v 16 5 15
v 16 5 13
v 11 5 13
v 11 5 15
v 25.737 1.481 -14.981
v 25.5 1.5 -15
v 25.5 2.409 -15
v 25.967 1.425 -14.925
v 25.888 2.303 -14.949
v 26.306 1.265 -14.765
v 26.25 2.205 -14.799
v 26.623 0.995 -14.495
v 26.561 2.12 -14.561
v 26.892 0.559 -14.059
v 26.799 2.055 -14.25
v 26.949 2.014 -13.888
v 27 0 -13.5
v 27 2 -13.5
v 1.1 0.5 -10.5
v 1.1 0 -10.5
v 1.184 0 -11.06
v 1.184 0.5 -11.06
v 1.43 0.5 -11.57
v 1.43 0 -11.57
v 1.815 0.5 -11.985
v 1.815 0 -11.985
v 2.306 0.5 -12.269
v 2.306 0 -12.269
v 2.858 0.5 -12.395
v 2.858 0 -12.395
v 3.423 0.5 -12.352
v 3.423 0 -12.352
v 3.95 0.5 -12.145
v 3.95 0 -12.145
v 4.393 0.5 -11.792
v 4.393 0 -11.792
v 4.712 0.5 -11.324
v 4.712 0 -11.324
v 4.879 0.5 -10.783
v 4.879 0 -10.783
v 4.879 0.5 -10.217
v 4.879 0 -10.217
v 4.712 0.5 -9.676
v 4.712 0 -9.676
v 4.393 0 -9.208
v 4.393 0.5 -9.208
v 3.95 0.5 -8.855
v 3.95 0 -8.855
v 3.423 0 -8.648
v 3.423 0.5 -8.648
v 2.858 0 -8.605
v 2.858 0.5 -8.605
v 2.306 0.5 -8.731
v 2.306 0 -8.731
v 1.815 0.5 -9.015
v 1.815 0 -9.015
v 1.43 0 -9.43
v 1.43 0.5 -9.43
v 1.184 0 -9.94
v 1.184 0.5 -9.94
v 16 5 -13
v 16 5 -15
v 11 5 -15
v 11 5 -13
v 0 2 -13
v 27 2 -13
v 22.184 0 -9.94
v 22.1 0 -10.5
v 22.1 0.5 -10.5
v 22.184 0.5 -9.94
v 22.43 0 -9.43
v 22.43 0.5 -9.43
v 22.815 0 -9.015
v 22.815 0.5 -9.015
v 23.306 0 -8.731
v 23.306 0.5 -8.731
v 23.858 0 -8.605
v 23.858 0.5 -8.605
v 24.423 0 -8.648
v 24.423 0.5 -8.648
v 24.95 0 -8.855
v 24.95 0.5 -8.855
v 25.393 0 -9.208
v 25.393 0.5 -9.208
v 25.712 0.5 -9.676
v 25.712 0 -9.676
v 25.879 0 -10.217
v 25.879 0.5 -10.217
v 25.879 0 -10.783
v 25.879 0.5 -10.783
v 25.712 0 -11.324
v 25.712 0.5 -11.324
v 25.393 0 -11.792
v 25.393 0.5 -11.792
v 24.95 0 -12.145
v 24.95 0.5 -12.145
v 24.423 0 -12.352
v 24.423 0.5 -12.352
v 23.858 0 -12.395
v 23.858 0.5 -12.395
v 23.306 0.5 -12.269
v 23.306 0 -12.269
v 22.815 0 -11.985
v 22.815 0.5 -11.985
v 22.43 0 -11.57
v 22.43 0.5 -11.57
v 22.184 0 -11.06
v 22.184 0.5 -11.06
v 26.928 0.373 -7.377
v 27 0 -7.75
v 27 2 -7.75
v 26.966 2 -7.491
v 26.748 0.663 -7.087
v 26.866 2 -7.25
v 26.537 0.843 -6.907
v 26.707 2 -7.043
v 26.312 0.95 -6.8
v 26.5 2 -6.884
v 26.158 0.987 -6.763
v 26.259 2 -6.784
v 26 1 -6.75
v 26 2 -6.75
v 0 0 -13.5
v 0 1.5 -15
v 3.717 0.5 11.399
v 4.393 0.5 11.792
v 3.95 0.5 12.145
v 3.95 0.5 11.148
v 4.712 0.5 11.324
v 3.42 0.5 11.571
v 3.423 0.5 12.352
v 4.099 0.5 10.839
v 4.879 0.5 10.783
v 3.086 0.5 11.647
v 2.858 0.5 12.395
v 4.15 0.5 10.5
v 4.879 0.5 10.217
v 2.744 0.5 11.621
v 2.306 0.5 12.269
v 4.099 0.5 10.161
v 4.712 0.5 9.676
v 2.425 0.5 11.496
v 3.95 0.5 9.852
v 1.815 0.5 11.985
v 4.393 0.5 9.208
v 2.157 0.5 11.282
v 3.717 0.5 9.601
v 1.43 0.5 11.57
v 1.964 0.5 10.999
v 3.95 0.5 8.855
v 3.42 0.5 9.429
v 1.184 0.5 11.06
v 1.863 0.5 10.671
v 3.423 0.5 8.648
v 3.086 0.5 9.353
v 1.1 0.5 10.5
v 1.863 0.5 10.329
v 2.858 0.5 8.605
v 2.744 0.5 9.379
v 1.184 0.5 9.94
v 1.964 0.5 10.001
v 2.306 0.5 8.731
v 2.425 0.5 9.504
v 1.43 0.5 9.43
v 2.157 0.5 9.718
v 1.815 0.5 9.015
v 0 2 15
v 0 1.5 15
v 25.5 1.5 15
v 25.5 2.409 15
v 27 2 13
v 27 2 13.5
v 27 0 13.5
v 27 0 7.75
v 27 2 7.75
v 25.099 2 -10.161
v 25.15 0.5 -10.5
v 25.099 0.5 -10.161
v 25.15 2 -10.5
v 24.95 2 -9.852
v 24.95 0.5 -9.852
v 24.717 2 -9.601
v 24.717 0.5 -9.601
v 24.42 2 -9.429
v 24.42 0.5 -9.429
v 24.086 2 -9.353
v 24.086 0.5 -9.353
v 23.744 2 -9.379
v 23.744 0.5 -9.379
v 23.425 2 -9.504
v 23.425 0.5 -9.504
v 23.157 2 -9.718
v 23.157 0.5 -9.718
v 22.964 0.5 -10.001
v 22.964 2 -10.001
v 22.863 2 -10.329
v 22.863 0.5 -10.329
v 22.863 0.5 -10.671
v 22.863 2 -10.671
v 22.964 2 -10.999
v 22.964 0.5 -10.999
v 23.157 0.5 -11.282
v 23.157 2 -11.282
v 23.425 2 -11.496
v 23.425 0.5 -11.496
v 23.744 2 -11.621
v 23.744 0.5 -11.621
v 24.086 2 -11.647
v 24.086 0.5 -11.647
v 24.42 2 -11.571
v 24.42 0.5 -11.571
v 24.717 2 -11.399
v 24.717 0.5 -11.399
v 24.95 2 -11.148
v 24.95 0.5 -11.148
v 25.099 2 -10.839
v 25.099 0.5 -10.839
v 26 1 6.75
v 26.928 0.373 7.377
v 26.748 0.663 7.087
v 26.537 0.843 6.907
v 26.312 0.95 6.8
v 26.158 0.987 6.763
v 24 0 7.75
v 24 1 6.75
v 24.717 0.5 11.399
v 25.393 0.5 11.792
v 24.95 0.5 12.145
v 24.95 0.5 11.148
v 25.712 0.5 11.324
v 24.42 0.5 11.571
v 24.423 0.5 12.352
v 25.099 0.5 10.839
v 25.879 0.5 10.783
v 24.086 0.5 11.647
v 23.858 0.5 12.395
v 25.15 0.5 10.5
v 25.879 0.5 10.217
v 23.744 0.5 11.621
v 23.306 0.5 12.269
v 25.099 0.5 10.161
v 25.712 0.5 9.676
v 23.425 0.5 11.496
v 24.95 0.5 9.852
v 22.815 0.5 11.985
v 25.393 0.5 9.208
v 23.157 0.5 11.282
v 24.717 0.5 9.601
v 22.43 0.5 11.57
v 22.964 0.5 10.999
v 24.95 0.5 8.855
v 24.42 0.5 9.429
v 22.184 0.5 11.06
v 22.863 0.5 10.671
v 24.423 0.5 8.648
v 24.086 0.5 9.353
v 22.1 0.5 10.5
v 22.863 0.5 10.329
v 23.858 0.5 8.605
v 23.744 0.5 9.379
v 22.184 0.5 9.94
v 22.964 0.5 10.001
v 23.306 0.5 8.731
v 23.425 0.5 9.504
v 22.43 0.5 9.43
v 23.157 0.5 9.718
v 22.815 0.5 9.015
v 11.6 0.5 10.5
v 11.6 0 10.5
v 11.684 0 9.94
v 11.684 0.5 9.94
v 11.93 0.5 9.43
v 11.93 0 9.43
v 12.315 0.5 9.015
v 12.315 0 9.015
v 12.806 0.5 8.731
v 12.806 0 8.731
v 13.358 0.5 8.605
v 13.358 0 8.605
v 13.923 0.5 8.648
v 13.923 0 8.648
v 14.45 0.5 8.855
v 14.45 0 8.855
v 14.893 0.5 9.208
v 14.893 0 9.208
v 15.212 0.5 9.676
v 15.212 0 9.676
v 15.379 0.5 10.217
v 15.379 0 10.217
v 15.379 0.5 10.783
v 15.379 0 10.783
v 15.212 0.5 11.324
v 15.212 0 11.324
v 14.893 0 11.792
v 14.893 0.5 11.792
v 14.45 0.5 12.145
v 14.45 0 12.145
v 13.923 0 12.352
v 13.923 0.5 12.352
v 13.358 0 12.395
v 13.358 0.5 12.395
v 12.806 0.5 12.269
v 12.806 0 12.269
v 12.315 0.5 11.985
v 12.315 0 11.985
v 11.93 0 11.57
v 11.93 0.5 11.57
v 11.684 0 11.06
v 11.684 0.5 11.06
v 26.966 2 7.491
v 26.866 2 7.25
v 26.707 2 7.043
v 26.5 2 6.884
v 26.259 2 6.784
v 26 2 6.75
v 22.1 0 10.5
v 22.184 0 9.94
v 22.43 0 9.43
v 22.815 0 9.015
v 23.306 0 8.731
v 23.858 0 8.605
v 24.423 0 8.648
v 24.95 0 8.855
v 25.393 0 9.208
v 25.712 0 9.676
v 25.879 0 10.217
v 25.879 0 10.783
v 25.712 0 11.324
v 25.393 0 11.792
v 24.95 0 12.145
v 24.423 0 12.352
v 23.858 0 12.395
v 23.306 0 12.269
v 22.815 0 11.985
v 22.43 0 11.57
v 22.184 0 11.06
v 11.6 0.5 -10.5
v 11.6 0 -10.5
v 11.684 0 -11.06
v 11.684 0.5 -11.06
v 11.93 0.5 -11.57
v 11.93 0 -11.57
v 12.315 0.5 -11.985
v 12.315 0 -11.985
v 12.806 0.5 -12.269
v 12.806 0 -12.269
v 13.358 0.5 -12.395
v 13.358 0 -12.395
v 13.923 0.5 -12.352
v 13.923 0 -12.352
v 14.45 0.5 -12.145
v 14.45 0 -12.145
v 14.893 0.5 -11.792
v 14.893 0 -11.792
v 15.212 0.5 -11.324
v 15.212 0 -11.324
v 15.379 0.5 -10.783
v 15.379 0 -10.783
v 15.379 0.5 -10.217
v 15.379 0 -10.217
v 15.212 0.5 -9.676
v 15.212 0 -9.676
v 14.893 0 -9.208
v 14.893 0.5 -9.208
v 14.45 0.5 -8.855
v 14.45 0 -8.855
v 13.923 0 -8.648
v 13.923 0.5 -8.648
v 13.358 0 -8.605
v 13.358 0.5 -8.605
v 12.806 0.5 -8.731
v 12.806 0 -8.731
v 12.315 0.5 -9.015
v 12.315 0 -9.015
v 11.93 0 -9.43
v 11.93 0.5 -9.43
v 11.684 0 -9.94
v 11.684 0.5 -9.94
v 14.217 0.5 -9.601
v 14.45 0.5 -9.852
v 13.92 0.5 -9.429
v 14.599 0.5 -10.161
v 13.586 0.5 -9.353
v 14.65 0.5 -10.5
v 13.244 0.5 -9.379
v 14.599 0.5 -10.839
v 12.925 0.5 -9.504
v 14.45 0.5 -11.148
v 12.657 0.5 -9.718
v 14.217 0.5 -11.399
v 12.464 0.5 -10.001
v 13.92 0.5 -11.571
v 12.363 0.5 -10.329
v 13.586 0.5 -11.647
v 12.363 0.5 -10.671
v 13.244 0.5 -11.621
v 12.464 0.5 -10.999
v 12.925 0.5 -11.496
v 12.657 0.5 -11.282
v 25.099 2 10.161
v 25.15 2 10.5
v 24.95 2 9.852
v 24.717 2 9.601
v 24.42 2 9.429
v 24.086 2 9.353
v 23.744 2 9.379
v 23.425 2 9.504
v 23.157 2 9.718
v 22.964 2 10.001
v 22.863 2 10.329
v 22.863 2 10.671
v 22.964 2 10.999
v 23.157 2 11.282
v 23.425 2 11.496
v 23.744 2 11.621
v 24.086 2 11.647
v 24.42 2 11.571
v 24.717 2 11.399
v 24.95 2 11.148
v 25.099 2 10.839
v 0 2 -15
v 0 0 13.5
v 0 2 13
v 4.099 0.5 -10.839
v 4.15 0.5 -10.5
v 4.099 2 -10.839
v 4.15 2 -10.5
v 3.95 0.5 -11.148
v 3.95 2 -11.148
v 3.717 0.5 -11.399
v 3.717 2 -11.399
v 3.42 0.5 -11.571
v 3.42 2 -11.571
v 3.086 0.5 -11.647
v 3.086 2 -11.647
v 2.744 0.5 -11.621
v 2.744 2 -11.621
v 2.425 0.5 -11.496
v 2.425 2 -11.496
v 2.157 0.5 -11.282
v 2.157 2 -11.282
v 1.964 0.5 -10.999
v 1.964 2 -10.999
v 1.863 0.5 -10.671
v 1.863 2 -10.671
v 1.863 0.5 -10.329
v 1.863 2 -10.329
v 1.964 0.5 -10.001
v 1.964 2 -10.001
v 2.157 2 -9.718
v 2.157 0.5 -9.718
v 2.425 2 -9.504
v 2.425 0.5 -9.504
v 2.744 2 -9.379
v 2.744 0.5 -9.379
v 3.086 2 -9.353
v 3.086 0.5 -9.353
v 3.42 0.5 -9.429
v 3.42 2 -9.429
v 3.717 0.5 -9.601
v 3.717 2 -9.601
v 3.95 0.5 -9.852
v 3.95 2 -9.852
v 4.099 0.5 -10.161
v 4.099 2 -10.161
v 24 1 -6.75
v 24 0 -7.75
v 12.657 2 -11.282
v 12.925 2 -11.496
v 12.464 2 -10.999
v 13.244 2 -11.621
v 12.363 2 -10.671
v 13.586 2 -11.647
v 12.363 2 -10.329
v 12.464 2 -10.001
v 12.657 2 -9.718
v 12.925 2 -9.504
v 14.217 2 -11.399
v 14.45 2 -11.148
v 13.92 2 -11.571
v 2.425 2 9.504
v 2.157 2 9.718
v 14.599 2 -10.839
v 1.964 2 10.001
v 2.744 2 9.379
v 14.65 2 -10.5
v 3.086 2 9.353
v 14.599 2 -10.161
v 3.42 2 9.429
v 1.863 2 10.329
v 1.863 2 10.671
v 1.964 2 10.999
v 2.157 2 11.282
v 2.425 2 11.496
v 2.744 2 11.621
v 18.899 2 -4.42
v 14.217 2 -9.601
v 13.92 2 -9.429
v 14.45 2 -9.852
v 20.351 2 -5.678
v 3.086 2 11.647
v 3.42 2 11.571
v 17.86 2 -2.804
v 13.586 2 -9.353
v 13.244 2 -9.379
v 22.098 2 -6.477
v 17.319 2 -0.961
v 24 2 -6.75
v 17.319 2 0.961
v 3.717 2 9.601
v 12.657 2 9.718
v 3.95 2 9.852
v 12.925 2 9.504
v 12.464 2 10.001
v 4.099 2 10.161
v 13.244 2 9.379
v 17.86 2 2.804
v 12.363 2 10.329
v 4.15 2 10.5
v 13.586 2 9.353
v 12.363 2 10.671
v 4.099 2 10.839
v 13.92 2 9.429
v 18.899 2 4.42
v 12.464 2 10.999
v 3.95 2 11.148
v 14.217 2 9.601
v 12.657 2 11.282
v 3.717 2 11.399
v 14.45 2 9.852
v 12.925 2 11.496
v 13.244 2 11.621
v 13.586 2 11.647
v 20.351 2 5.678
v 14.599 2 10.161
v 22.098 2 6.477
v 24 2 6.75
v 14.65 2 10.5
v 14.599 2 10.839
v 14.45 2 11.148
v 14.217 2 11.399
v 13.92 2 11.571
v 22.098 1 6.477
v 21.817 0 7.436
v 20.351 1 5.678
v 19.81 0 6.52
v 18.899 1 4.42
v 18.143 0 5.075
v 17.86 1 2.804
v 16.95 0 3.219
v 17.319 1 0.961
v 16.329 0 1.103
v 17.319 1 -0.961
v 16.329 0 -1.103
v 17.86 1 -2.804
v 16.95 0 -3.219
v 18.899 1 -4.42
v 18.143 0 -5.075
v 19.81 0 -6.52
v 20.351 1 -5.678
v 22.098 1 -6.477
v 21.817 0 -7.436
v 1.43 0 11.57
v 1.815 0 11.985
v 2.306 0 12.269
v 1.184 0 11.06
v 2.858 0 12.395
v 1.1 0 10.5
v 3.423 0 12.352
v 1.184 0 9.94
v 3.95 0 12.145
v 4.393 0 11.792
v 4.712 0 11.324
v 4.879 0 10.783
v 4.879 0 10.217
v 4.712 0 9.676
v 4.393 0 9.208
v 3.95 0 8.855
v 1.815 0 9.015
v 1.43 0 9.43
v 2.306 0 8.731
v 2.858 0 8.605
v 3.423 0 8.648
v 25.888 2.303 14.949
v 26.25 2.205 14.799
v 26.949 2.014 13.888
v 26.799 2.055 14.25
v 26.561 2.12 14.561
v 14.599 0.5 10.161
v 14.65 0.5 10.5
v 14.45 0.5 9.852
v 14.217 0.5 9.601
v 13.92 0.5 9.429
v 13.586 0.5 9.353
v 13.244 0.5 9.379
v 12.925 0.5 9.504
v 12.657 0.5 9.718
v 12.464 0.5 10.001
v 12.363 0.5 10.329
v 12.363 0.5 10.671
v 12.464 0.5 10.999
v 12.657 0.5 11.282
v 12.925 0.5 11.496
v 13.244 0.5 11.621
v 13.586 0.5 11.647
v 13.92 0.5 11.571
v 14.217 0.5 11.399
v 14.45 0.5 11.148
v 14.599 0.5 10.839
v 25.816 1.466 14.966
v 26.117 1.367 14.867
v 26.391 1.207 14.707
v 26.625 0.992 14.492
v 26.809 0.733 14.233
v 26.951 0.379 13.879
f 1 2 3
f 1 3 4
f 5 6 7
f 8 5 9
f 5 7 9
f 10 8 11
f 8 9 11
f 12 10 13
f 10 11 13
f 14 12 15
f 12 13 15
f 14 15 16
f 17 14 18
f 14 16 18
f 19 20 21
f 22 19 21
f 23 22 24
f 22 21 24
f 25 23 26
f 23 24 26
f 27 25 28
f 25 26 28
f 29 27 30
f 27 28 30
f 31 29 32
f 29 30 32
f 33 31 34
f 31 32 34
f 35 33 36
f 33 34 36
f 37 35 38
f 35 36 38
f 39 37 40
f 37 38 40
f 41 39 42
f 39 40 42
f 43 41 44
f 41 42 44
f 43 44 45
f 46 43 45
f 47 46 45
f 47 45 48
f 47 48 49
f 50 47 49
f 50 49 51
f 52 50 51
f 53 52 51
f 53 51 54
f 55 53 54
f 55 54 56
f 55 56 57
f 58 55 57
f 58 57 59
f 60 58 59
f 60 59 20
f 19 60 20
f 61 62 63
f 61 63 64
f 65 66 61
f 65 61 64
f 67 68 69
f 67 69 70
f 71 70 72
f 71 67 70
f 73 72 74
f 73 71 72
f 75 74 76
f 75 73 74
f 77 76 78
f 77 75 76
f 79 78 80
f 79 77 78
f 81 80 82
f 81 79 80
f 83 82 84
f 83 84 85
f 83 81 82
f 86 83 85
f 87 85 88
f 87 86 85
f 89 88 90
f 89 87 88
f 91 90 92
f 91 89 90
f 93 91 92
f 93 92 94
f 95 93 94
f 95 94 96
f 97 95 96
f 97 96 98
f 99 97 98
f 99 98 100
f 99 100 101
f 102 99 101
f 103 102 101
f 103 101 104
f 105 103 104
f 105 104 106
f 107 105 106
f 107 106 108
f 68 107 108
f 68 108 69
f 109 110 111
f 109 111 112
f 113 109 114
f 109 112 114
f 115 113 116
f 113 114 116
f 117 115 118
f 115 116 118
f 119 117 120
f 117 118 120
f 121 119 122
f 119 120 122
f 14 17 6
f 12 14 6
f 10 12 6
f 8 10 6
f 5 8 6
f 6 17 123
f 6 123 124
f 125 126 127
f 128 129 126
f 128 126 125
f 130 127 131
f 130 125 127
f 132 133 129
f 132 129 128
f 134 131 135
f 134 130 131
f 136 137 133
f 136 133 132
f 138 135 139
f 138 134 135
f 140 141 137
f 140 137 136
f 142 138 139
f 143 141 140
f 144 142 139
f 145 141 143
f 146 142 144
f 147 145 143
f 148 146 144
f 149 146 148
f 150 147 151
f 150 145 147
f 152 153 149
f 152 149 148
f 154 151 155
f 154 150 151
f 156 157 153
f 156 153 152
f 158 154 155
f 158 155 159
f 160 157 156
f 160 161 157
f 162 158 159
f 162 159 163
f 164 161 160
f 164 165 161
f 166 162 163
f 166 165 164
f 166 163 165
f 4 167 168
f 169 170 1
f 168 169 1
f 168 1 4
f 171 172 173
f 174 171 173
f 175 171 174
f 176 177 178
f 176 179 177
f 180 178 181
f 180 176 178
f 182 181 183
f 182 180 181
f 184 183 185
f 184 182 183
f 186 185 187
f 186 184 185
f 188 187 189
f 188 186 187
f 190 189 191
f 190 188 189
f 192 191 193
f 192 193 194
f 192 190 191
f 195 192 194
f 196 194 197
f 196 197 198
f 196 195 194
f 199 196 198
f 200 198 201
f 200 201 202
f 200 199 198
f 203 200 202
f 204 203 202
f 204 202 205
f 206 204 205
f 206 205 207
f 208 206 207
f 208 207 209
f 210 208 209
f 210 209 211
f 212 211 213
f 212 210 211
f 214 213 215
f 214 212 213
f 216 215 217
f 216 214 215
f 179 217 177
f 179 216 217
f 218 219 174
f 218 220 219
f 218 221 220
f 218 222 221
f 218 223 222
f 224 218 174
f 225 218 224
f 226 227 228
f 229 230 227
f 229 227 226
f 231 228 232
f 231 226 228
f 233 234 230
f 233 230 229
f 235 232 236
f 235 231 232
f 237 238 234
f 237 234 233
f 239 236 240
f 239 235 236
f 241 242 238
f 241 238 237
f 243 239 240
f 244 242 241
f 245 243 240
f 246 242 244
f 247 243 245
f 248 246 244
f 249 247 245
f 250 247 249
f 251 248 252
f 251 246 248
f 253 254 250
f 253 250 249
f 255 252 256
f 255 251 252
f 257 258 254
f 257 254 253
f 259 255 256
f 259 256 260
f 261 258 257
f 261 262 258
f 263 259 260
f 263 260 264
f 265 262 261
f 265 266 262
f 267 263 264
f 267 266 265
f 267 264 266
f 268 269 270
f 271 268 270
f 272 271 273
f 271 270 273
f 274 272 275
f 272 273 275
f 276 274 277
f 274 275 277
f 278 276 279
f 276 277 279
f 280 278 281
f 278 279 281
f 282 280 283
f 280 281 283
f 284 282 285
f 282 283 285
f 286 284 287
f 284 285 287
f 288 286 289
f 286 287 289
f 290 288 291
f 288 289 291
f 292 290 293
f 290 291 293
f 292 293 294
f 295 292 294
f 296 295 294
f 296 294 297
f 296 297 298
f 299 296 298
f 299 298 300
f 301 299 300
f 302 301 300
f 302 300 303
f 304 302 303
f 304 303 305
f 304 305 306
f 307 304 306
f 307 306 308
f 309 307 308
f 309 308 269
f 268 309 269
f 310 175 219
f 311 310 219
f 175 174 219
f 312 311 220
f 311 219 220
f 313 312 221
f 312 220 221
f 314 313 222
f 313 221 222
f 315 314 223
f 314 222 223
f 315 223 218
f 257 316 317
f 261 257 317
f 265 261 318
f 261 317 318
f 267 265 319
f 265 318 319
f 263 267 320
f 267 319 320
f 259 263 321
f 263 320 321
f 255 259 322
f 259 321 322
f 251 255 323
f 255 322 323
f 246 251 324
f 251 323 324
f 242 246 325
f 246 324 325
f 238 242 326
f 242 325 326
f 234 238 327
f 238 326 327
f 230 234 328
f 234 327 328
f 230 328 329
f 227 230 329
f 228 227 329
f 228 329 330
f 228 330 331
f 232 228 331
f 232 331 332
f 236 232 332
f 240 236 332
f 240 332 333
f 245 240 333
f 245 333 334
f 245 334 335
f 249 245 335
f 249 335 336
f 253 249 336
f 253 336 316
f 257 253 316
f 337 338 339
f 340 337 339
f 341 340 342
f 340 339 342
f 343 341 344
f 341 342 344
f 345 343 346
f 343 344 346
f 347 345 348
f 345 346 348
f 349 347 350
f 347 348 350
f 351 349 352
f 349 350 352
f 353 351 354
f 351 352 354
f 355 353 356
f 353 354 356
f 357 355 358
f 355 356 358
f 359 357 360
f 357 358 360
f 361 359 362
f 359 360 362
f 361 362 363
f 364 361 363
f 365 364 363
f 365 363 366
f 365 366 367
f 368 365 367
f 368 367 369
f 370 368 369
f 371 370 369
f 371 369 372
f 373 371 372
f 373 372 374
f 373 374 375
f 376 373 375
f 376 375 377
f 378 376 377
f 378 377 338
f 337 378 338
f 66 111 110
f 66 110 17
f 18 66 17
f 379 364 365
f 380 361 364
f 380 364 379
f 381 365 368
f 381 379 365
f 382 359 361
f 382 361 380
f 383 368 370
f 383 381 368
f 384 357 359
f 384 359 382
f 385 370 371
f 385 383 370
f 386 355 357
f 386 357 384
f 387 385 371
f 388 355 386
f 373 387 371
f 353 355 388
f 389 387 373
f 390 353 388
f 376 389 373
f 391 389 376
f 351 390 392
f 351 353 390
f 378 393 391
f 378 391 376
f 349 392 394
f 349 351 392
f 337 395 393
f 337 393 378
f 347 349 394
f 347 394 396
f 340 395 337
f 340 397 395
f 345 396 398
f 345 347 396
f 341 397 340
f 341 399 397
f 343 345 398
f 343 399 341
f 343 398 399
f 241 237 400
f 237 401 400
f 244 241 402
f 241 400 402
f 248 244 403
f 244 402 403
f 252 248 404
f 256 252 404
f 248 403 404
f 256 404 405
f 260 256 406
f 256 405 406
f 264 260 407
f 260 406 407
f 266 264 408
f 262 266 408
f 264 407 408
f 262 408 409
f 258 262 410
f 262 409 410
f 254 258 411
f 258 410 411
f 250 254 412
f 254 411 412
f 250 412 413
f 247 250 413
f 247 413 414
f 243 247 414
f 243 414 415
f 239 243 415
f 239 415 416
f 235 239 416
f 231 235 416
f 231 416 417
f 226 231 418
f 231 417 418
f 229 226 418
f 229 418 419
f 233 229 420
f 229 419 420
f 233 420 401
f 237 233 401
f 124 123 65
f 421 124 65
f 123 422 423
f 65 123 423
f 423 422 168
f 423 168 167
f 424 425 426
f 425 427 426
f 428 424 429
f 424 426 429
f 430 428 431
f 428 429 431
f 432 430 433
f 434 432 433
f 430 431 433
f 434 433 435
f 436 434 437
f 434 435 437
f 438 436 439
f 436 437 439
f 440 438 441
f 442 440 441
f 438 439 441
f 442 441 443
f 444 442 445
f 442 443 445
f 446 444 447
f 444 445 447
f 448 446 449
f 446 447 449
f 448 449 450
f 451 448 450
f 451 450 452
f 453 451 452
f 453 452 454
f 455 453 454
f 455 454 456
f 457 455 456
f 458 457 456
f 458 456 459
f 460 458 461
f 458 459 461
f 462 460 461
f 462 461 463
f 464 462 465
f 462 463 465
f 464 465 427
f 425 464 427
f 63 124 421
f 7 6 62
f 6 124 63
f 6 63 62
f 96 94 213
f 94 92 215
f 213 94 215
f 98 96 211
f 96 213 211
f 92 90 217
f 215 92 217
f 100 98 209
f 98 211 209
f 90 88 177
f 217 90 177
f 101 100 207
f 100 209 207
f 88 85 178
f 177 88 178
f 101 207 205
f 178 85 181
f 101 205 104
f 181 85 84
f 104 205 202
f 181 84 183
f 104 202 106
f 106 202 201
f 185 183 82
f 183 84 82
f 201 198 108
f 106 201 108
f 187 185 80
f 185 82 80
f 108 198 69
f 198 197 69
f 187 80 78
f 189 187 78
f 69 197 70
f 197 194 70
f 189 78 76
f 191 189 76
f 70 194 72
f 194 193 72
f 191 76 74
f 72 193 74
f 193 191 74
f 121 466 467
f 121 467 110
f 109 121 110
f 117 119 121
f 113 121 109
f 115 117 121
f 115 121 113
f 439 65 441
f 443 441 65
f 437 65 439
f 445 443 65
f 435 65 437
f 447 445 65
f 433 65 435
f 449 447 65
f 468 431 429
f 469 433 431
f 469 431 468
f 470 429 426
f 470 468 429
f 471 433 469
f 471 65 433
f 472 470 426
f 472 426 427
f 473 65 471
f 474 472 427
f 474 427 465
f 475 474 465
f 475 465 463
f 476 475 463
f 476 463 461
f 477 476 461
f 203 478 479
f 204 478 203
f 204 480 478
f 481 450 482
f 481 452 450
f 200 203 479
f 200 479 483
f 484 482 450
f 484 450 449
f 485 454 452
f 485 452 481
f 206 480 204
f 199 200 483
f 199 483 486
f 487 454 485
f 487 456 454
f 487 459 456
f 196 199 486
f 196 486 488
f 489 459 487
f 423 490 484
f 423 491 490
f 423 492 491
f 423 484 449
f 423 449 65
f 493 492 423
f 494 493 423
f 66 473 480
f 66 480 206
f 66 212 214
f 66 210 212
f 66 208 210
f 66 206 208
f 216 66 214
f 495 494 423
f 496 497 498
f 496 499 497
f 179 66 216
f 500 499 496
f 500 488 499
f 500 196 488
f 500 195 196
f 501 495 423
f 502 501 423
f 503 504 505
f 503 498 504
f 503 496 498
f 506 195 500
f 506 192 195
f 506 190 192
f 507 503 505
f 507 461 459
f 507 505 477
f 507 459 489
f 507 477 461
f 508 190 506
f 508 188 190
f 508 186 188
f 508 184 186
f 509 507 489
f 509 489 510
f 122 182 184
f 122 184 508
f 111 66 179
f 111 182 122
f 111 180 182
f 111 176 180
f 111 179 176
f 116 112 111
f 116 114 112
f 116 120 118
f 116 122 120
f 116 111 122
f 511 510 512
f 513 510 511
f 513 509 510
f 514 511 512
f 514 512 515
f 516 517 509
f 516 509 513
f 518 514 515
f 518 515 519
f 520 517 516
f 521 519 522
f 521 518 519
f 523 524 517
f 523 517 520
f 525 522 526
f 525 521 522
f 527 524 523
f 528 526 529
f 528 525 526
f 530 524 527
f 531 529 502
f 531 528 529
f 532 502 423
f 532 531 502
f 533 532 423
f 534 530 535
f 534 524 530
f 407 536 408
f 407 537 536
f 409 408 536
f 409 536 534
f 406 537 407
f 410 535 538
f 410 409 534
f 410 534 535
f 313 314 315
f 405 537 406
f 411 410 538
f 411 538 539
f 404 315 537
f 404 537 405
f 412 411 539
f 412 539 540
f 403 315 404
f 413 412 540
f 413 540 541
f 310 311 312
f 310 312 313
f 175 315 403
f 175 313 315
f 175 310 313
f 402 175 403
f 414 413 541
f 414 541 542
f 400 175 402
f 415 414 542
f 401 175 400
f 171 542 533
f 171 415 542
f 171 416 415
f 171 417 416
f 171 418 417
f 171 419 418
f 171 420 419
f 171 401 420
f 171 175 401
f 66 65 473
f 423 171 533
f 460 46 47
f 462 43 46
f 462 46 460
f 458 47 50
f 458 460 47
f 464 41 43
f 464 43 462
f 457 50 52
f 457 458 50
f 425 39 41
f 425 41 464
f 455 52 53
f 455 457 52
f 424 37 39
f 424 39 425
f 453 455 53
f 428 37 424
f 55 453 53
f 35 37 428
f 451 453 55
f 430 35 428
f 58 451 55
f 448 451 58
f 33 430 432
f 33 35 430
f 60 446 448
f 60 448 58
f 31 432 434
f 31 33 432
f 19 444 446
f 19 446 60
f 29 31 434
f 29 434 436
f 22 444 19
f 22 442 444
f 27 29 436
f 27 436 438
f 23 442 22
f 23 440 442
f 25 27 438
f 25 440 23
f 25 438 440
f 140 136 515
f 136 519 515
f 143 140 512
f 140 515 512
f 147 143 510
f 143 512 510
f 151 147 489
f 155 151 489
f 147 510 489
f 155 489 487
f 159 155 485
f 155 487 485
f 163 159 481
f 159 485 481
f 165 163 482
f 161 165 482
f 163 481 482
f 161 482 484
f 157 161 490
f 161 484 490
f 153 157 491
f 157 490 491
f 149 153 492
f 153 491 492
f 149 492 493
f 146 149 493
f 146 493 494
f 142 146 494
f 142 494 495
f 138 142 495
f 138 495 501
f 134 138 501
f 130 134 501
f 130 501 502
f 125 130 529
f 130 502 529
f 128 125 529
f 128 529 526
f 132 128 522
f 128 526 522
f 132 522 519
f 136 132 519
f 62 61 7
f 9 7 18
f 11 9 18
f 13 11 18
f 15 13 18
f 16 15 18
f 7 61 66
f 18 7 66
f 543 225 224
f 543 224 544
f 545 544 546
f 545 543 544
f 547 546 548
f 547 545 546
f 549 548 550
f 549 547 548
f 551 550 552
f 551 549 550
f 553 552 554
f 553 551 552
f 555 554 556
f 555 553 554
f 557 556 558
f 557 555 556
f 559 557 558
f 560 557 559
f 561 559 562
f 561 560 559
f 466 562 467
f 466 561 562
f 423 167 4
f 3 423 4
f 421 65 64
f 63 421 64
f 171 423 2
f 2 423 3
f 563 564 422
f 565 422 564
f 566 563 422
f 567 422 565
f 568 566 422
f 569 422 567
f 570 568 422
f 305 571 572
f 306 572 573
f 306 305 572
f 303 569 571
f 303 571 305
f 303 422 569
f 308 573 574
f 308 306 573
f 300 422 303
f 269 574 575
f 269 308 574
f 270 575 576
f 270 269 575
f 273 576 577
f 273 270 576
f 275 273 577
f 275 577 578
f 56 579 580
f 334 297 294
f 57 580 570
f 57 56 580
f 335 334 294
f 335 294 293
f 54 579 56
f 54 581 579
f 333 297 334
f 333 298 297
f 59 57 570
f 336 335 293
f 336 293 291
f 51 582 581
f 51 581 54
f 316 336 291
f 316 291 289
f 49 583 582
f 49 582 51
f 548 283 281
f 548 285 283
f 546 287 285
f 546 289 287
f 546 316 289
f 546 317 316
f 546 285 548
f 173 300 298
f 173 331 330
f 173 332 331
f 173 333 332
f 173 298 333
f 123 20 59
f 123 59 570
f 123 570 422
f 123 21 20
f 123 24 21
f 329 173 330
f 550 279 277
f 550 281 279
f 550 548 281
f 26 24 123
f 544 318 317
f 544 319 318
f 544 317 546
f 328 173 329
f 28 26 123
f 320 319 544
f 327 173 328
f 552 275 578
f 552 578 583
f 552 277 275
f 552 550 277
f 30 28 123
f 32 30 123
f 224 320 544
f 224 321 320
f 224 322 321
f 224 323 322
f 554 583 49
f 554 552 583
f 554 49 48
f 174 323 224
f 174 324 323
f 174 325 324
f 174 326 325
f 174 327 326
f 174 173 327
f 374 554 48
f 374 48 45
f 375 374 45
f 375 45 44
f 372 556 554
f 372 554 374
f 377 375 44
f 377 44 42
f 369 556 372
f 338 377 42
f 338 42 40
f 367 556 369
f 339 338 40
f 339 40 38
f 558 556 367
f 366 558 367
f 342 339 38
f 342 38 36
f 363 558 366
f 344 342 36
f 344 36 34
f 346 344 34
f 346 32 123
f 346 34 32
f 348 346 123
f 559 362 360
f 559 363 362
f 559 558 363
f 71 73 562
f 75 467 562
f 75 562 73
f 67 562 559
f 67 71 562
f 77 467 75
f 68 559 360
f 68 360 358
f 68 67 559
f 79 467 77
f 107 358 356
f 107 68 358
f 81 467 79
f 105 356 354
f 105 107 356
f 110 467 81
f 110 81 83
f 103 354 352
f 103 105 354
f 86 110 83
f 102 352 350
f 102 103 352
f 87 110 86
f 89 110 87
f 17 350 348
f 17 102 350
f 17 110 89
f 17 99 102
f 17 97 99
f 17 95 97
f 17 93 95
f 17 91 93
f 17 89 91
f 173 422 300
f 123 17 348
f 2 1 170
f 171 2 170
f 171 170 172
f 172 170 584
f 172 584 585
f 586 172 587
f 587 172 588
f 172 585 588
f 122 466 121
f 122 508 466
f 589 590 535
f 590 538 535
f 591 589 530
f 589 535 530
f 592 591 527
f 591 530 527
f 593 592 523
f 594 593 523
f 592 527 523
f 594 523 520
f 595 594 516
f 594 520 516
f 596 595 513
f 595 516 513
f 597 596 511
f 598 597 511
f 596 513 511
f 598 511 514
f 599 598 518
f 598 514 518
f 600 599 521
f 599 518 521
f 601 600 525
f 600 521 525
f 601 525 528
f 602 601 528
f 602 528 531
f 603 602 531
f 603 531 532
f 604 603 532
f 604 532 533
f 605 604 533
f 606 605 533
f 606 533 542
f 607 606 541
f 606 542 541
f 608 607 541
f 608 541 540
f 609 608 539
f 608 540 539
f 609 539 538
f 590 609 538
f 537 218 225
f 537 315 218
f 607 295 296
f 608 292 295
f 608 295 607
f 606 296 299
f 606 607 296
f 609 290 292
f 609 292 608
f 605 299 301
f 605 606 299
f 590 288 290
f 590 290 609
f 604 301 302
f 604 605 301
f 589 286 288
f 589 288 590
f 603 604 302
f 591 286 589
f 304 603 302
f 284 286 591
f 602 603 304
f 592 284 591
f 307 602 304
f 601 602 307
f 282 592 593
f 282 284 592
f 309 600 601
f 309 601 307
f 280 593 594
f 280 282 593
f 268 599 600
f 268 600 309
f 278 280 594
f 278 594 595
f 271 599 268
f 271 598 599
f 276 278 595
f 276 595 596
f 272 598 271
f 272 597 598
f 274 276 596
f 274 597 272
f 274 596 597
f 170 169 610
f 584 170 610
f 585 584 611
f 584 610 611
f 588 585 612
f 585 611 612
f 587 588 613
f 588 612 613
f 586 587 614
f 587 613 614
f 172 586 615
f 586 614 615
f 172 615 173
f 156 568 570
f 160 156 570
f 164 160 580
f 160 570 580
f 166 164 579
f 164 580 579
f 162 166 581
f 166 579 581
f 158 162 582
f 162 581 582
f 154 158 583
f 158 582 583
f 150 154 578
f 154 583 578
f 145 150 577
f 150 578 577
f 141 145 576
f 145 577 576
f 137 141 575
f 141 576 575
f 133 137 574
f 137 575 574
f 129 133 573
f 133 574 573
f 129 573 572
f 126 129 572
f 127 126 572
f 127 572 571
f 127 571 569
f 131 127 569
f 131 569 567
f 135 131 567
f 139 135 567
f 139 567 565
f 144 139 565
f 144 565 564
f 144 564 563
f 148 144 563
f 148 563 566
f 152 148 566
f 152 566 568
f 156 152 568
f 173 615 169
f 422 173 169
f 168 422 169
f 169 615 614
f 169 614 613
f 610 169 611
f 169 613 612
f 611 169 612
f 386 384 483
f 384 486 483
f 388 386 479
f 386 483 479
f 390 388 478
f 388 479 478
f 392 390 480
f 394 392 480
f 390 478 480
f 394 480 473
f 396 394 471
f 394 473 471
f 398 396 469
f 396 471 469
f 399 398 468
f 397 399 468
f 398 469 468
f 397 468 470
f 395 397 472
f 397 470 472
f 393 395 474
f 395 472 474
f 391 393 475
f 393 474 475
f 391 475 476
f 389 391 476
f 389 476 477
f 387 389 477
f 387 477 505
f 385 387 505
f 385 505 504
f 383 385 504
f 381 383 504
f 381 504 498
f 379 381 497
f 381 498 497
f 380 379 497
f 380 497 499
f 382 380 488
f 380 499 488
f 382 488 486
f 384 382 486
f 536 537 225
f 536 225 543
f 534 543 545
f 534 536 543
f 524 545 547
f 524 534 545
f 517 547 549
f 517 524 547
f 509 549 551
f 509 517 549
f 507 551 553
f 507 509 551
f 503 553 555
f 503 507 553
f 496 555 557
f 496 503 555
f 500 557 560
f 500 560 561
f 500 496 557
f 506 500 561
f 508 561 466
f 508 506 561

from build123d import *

# Parameters (mm, degrees)
EXTRUDE_1_DEPTH              = 27
CUT_EXTRUDE_1_REACH          = 33.032
HOLE_WIZARD_M2_1_D           = 2.3
HOLE_WIZARD_M2_1_CBORE_D     = 3.8
HOLE_WIZARD_M2_1_CBORE_DEPTH = 0.5
PATTERN_LINEAR_1_COUNT       = 3
PATTERN_LINEAR_1_PITCH       = 10.5
MIRROR_1_COPY_1_D            = 2.3
MIRROR_1_COPY_1_CBORE_D      = 3.8
MIRROR_1_COPY_1_CBORE_DEPTH  = 0.5
MIRROR_1_COPY_2_D            = 2.3
MIRROR_1_COPY_2_CBORE_D      = 3.8
MIRROR_1_COPY_2_CBORE_DEPTH  = 0.5
CHAMFER_1_SIZE               = 1
MIRROR_3_COPY_1_D            = 2.3
MIRROR_3_COPY_1_CBORE_D      = 3.8
MIRROR_3_COPY_1_CBORE_DEPTH  = 0.5
MIRROR_3_COPY_2_D            = 2.3
MIRROR_3_COPY_2_CBORE_D      = 3.8
MIRROR_3_COPY_2_CBORE_DEPTH  = 0.5
MIRROR_3_COPY_3_D            = 2.3
MIRROR_3_COPY_3_CBORE_D      = 3.8
MIRROR_3_COPY_3_CBORE_DEPTH  = 0.5
MIRROR_3_COPY_4_D            = 2.3
MIRROR_3_COPY_4_CBORE_D      = 3.8
MIRROR_3_COPY_4_CBORE_DEPTH  = 0.5
MIRROR_3_COPY_5_D            = 2.3
MIRROR_3_COPY_5_CBORE_D      = 3.8
MIRROR_3_COPY_5_CBORE_DEPTH  = 0.5
CHAMFER_1_OF_MIRROR_3_SIZE   = 1
FILLET_1_R                   = 1.5
FILLET_2_R                   = 1
CHAMFER_2_SIZE               = 1.5
CUT_EXTRUDE_2_DEPTH          = 41.669398815


with BuildPart() as part:
    # ｽｹｯﾁ1 → ﾎﾞｽ - 押し出し1 (new, symmetric)
    with BuildSketch(Plane(origin=(0, 0, 0), x_dir=(0, 0, -1), z_dir=(1, 0, 0))):
        Polygon((-15, 0), (15, 0), (15, 5), (13, 5), (13, 2), (-13, 2), (-13, 5), (-15, 5), align=None)
    extrude(amount=EXTRUDE_1_DEPTH, both=True)

    # ｽｹｯﾁ2 → ｶｯﾄ - 押し出し1 (cut, up to next)
    with BuildSketch(Plane(origin=(0, 2, 0), x_dir=(1, 0, 0), z_dir=(0, 1, 0)), mode=Mode.PRIVATE) as cut_extrude_1_sk1:
        with BuildLine():
            Line((24, 6.75), (28, 6.75))
            Line((28, 6.75), (28, -6.75))
            Line((28, -6.75), (24, -6.75))
            ThreePointArc((24, -6.75), (17.25, 0), (24, 6.75))
        make_face()
    cut_extrude_1_tool1 = extrude(cut_extrude_1_sk1.sketch, amount=-CUT_EXTRUDE_1_REACH, mode=Mode.PRIVATE) & part.part
    cut_extrude_1 = cut_extrude_1_tool1.solids().sort_by_distance((23.22727, 2, 0))[0]
    add(cut_extrude_1, mode=Mode.SUBTRACT)

    # M2 丸平ねじ用座ぐり穴1 (through all)
    with Locations(Plane(origin=(0, 0, 0), x_dir=(-1, 0, 0), z_dir=(0, -1, 0))):
        with Locations((-24, -10.5)):
            hole_wizard_m2_1 = CounterBoreHole(HOLE_WIZARD_M2_1_D / 2, HOLE_WIZARD_M2_1_CBORE_D / 2, HOLE_WIZARD_M2_1_CBORE_DEPTH)

    # 直線ﾊﾟﾀｰﾝ1: M2 丸平ねじ用座ぐり穴1 ×3
    with Locations(*[(-i * PATTERN_LINEAR_1_PITCH, 0, 0) for i in range(1, PATTERN_LINEAR_1_COUNT)]):
        add(hole_wizard_m2_1, mode=Mode.SUBTRACT)

    # ﾐﾗｰ1: M2 丸平ねじ用座ぐり穴1 across plane
    add(hole_wizard_m2_1.mirror(Plane.XY), mode=Mode.SUBTRACT)

    # ﾐﾗｰ1 copy 1 (through all)
    with Locations(Plane(origin=(-10.5, 0, 0), x_dir=(-1, 0, 0), z_dir=(0, -1, 0))):
        with Locations((-24, 10.5)):
            CounterBoreHole(MIRROR_1_COPY_1_D / 2, MIRROR_1_COPY_1_CBORE_D / 2, MIRROR_1_COPY_1_CBORE_DEPTH)

    # ﾐﾗｰ1 copy 2 (through all)
    with Locations(Plane(origin=(-21, 0, 0), x_dir=(-1, 0, 0), z_dir=(0, -1, 0))):
        with Locations((-24, 10.5)):
            CounterBoreHole(MIRROR_1_COPY_2_D / 2, MIRROR_1_COPY_2_CBORE_D / 2, MIRROR_1_COPY_2_CBORE_DEPTH)

    # 面取り1
    chamfer_1_edges = [part.edges().sort_by_distance(p)[0] for p in [
        (25.5, 0, 6.75),
        (17.25, 0, 0),
        (25.5, 0, -6.75),
    ]]
    chamfer(chamfer_1_edges, length=CHAMFER_1_SIZE)

    # ﾐﾗｰ3: ｶｯﾄ - 押し出し1, M2 丸平ねじ用座ぐり穴1 across plane
    add(cut_extrude_1.mirror(Plane(origin=(0, 0, 0), x_dir=(0, 0, 1), z_dir=(1, 0, 0))), mode=Mode.SUBTRACT)
    add(hole_wizard_m2_1.mirror(Plane(origin=(0, 0, 0), x_dir=(0, 0, 1), z_dir=(1, 0, 0))), mode=Mode.SUBTRACT)

    # ﾐﾗｰ3 copy 1 (through all)
    with Locations(Plane(origin=(10.5, 0, 0), x_dir=(1, 0, 0), z_dir=(0, -1, 0))):
        with Locations((-24, 10.5)):
            CounterBoreHole(MIRROR_3_COPY_1_D / 2, MIRROR_3_COPY_1_CBORE_D / 2, MIRROR_3_COPY_1_CBORE_DEPTH)

    # ﾐﾗｰ3 copy 2 (through all)
    with Locations(Plane(origin=(21, 0, 0), x_dir=(1, 0, 0), z_dir=(0, -1, 0))):
        with Locations((-24, 10.5)):
            CounterBoreHole(MIRROR_3_COPY_2_D / 2, MIRROR_3_COPY_2_CBORE_D / 2, MIRROR_3_COPY_2_CBORE_DEPTH)

    # ﾐﾗｰ3 copy 3 (through all)
    with Locations(Plane.XZ):
        with Locations((-24, -10.5)):
            CounterBoreHole(MIRROR_3_COPY_3_D / 2, MIRROR_3_COPY_3_CBORE_D / 2, MIRROR_3_COPY_3_CBORE_DEPTH)

    # ﾐﾗｰ3 copy 4 (through all)
    with Locations(Plane(origin=(10.5, 0, 0), x_dir=(1, 0, 0), z_dir=(0, -1, 0))):
        with Locations((-24, -10.5)):
            CounterBoreHole(MIRROR_3_COPY_4_D / 2, MIRROR_3_COPY_4_CBORE_D / 2, MIRROR_3_COPY_4_CBORE_DEPTH)

    # ﾐﾗｰ3 copy 5 (through all)
    with Locations(Plane(origin=(21, 0, 0), x_dir=(1, 0, 0), z_dir=(0, -1, 0))):
        with Locations((-24, -10.5)):
            CounterBoreHole(MIRROR_3_COPY_5_D / 2, MIRROR_3_COPY_5_CBORE_D / 2, MIRROR_3_COPY_5_CBORE_DEPTH)

    # 面取り1 of ﾐﾗｰ3
    chamfer_1_of_mirror_3_edges = [part.edges().sort_by_distance(p)[0] for p in [
        (-25.5, 0, 6.75),
        (-17.25, 0, 0),
        (-25.5, 0, -6.75),
    ]]
    chamfer(chamfer_1_of_mirror_3_edges, length=CHAMFER_1_OF_MIRROR_3_SIZE)

    # ﾌｨﾚｯﾄ1
    fillet_1_edges = [part.edges().sort_by_distance(p)[0] for p in [
        (27, 2.5, -15),
        (-27, 2.5, 15),
        (27, 2.5, 15),
        (-27, 2.5, -15),
    ]]
    fillet(fillet_1_edges, radius=FILLET_1_R)

    # ﾌｨﾚｯﾄ2
    fillet_2_edges = [part.edges().sort_by_distance(p)[0] for p in [
        (27, 1.5, -6.75),
        (27, 1.5, 6.75),
        (-27, 1.5, -6.75),
        (-27, 1.5, 6.75),
    ]]
    fillet(fillet_2_edges, radius=FILLET_2_R)

    # 面取り2
    # the kernel refuses this chamfer: 1.5 mm, written as the material it takes off along each edge
    with BuildSketch(Plane(origin=(-29.357524482, 0, -15), x_dir=(0, -0.02749587661058654, 0.9996219169112965), z_dir=(1, 0, 0)), Plane(origin=(29.357524482, 0, 15), x_dir=(0, -0.027495876610586178, -0.9996219169112968), z_dir=(-1, 0, 0))) as chamfer_2_piece_1:
        Polygon((CHAMFER_2_SIZE * 0.999621916911, -CHAMFER_2_SIZE * 0.0274958766106), (-CHAMFER_2_SIZE * 0.0274958766106, -CHAMFER_2_SIZE * 0.999621916911), (0, 0), align=None)
    extrude(amount=58.715048964, mode=Mode.SUBTRACT)

    # ｽｹｯﾁ6 → ｶｯﾄ - 押し出し2 (cut, through all)
    with BuildSketch(Plane.XY.offset(15)):
        Polygon((27, 5), (16, 5), (27, 2), align=None)
        Polygon((11, 5), (-27, 5), (-27, 0), (0, 0), (0, 2), align=None)
    extrude(amount=-CUT_EXTRUDE_2_DEPTH, mode=Mode.SUBTRACT)


solid = part.part
